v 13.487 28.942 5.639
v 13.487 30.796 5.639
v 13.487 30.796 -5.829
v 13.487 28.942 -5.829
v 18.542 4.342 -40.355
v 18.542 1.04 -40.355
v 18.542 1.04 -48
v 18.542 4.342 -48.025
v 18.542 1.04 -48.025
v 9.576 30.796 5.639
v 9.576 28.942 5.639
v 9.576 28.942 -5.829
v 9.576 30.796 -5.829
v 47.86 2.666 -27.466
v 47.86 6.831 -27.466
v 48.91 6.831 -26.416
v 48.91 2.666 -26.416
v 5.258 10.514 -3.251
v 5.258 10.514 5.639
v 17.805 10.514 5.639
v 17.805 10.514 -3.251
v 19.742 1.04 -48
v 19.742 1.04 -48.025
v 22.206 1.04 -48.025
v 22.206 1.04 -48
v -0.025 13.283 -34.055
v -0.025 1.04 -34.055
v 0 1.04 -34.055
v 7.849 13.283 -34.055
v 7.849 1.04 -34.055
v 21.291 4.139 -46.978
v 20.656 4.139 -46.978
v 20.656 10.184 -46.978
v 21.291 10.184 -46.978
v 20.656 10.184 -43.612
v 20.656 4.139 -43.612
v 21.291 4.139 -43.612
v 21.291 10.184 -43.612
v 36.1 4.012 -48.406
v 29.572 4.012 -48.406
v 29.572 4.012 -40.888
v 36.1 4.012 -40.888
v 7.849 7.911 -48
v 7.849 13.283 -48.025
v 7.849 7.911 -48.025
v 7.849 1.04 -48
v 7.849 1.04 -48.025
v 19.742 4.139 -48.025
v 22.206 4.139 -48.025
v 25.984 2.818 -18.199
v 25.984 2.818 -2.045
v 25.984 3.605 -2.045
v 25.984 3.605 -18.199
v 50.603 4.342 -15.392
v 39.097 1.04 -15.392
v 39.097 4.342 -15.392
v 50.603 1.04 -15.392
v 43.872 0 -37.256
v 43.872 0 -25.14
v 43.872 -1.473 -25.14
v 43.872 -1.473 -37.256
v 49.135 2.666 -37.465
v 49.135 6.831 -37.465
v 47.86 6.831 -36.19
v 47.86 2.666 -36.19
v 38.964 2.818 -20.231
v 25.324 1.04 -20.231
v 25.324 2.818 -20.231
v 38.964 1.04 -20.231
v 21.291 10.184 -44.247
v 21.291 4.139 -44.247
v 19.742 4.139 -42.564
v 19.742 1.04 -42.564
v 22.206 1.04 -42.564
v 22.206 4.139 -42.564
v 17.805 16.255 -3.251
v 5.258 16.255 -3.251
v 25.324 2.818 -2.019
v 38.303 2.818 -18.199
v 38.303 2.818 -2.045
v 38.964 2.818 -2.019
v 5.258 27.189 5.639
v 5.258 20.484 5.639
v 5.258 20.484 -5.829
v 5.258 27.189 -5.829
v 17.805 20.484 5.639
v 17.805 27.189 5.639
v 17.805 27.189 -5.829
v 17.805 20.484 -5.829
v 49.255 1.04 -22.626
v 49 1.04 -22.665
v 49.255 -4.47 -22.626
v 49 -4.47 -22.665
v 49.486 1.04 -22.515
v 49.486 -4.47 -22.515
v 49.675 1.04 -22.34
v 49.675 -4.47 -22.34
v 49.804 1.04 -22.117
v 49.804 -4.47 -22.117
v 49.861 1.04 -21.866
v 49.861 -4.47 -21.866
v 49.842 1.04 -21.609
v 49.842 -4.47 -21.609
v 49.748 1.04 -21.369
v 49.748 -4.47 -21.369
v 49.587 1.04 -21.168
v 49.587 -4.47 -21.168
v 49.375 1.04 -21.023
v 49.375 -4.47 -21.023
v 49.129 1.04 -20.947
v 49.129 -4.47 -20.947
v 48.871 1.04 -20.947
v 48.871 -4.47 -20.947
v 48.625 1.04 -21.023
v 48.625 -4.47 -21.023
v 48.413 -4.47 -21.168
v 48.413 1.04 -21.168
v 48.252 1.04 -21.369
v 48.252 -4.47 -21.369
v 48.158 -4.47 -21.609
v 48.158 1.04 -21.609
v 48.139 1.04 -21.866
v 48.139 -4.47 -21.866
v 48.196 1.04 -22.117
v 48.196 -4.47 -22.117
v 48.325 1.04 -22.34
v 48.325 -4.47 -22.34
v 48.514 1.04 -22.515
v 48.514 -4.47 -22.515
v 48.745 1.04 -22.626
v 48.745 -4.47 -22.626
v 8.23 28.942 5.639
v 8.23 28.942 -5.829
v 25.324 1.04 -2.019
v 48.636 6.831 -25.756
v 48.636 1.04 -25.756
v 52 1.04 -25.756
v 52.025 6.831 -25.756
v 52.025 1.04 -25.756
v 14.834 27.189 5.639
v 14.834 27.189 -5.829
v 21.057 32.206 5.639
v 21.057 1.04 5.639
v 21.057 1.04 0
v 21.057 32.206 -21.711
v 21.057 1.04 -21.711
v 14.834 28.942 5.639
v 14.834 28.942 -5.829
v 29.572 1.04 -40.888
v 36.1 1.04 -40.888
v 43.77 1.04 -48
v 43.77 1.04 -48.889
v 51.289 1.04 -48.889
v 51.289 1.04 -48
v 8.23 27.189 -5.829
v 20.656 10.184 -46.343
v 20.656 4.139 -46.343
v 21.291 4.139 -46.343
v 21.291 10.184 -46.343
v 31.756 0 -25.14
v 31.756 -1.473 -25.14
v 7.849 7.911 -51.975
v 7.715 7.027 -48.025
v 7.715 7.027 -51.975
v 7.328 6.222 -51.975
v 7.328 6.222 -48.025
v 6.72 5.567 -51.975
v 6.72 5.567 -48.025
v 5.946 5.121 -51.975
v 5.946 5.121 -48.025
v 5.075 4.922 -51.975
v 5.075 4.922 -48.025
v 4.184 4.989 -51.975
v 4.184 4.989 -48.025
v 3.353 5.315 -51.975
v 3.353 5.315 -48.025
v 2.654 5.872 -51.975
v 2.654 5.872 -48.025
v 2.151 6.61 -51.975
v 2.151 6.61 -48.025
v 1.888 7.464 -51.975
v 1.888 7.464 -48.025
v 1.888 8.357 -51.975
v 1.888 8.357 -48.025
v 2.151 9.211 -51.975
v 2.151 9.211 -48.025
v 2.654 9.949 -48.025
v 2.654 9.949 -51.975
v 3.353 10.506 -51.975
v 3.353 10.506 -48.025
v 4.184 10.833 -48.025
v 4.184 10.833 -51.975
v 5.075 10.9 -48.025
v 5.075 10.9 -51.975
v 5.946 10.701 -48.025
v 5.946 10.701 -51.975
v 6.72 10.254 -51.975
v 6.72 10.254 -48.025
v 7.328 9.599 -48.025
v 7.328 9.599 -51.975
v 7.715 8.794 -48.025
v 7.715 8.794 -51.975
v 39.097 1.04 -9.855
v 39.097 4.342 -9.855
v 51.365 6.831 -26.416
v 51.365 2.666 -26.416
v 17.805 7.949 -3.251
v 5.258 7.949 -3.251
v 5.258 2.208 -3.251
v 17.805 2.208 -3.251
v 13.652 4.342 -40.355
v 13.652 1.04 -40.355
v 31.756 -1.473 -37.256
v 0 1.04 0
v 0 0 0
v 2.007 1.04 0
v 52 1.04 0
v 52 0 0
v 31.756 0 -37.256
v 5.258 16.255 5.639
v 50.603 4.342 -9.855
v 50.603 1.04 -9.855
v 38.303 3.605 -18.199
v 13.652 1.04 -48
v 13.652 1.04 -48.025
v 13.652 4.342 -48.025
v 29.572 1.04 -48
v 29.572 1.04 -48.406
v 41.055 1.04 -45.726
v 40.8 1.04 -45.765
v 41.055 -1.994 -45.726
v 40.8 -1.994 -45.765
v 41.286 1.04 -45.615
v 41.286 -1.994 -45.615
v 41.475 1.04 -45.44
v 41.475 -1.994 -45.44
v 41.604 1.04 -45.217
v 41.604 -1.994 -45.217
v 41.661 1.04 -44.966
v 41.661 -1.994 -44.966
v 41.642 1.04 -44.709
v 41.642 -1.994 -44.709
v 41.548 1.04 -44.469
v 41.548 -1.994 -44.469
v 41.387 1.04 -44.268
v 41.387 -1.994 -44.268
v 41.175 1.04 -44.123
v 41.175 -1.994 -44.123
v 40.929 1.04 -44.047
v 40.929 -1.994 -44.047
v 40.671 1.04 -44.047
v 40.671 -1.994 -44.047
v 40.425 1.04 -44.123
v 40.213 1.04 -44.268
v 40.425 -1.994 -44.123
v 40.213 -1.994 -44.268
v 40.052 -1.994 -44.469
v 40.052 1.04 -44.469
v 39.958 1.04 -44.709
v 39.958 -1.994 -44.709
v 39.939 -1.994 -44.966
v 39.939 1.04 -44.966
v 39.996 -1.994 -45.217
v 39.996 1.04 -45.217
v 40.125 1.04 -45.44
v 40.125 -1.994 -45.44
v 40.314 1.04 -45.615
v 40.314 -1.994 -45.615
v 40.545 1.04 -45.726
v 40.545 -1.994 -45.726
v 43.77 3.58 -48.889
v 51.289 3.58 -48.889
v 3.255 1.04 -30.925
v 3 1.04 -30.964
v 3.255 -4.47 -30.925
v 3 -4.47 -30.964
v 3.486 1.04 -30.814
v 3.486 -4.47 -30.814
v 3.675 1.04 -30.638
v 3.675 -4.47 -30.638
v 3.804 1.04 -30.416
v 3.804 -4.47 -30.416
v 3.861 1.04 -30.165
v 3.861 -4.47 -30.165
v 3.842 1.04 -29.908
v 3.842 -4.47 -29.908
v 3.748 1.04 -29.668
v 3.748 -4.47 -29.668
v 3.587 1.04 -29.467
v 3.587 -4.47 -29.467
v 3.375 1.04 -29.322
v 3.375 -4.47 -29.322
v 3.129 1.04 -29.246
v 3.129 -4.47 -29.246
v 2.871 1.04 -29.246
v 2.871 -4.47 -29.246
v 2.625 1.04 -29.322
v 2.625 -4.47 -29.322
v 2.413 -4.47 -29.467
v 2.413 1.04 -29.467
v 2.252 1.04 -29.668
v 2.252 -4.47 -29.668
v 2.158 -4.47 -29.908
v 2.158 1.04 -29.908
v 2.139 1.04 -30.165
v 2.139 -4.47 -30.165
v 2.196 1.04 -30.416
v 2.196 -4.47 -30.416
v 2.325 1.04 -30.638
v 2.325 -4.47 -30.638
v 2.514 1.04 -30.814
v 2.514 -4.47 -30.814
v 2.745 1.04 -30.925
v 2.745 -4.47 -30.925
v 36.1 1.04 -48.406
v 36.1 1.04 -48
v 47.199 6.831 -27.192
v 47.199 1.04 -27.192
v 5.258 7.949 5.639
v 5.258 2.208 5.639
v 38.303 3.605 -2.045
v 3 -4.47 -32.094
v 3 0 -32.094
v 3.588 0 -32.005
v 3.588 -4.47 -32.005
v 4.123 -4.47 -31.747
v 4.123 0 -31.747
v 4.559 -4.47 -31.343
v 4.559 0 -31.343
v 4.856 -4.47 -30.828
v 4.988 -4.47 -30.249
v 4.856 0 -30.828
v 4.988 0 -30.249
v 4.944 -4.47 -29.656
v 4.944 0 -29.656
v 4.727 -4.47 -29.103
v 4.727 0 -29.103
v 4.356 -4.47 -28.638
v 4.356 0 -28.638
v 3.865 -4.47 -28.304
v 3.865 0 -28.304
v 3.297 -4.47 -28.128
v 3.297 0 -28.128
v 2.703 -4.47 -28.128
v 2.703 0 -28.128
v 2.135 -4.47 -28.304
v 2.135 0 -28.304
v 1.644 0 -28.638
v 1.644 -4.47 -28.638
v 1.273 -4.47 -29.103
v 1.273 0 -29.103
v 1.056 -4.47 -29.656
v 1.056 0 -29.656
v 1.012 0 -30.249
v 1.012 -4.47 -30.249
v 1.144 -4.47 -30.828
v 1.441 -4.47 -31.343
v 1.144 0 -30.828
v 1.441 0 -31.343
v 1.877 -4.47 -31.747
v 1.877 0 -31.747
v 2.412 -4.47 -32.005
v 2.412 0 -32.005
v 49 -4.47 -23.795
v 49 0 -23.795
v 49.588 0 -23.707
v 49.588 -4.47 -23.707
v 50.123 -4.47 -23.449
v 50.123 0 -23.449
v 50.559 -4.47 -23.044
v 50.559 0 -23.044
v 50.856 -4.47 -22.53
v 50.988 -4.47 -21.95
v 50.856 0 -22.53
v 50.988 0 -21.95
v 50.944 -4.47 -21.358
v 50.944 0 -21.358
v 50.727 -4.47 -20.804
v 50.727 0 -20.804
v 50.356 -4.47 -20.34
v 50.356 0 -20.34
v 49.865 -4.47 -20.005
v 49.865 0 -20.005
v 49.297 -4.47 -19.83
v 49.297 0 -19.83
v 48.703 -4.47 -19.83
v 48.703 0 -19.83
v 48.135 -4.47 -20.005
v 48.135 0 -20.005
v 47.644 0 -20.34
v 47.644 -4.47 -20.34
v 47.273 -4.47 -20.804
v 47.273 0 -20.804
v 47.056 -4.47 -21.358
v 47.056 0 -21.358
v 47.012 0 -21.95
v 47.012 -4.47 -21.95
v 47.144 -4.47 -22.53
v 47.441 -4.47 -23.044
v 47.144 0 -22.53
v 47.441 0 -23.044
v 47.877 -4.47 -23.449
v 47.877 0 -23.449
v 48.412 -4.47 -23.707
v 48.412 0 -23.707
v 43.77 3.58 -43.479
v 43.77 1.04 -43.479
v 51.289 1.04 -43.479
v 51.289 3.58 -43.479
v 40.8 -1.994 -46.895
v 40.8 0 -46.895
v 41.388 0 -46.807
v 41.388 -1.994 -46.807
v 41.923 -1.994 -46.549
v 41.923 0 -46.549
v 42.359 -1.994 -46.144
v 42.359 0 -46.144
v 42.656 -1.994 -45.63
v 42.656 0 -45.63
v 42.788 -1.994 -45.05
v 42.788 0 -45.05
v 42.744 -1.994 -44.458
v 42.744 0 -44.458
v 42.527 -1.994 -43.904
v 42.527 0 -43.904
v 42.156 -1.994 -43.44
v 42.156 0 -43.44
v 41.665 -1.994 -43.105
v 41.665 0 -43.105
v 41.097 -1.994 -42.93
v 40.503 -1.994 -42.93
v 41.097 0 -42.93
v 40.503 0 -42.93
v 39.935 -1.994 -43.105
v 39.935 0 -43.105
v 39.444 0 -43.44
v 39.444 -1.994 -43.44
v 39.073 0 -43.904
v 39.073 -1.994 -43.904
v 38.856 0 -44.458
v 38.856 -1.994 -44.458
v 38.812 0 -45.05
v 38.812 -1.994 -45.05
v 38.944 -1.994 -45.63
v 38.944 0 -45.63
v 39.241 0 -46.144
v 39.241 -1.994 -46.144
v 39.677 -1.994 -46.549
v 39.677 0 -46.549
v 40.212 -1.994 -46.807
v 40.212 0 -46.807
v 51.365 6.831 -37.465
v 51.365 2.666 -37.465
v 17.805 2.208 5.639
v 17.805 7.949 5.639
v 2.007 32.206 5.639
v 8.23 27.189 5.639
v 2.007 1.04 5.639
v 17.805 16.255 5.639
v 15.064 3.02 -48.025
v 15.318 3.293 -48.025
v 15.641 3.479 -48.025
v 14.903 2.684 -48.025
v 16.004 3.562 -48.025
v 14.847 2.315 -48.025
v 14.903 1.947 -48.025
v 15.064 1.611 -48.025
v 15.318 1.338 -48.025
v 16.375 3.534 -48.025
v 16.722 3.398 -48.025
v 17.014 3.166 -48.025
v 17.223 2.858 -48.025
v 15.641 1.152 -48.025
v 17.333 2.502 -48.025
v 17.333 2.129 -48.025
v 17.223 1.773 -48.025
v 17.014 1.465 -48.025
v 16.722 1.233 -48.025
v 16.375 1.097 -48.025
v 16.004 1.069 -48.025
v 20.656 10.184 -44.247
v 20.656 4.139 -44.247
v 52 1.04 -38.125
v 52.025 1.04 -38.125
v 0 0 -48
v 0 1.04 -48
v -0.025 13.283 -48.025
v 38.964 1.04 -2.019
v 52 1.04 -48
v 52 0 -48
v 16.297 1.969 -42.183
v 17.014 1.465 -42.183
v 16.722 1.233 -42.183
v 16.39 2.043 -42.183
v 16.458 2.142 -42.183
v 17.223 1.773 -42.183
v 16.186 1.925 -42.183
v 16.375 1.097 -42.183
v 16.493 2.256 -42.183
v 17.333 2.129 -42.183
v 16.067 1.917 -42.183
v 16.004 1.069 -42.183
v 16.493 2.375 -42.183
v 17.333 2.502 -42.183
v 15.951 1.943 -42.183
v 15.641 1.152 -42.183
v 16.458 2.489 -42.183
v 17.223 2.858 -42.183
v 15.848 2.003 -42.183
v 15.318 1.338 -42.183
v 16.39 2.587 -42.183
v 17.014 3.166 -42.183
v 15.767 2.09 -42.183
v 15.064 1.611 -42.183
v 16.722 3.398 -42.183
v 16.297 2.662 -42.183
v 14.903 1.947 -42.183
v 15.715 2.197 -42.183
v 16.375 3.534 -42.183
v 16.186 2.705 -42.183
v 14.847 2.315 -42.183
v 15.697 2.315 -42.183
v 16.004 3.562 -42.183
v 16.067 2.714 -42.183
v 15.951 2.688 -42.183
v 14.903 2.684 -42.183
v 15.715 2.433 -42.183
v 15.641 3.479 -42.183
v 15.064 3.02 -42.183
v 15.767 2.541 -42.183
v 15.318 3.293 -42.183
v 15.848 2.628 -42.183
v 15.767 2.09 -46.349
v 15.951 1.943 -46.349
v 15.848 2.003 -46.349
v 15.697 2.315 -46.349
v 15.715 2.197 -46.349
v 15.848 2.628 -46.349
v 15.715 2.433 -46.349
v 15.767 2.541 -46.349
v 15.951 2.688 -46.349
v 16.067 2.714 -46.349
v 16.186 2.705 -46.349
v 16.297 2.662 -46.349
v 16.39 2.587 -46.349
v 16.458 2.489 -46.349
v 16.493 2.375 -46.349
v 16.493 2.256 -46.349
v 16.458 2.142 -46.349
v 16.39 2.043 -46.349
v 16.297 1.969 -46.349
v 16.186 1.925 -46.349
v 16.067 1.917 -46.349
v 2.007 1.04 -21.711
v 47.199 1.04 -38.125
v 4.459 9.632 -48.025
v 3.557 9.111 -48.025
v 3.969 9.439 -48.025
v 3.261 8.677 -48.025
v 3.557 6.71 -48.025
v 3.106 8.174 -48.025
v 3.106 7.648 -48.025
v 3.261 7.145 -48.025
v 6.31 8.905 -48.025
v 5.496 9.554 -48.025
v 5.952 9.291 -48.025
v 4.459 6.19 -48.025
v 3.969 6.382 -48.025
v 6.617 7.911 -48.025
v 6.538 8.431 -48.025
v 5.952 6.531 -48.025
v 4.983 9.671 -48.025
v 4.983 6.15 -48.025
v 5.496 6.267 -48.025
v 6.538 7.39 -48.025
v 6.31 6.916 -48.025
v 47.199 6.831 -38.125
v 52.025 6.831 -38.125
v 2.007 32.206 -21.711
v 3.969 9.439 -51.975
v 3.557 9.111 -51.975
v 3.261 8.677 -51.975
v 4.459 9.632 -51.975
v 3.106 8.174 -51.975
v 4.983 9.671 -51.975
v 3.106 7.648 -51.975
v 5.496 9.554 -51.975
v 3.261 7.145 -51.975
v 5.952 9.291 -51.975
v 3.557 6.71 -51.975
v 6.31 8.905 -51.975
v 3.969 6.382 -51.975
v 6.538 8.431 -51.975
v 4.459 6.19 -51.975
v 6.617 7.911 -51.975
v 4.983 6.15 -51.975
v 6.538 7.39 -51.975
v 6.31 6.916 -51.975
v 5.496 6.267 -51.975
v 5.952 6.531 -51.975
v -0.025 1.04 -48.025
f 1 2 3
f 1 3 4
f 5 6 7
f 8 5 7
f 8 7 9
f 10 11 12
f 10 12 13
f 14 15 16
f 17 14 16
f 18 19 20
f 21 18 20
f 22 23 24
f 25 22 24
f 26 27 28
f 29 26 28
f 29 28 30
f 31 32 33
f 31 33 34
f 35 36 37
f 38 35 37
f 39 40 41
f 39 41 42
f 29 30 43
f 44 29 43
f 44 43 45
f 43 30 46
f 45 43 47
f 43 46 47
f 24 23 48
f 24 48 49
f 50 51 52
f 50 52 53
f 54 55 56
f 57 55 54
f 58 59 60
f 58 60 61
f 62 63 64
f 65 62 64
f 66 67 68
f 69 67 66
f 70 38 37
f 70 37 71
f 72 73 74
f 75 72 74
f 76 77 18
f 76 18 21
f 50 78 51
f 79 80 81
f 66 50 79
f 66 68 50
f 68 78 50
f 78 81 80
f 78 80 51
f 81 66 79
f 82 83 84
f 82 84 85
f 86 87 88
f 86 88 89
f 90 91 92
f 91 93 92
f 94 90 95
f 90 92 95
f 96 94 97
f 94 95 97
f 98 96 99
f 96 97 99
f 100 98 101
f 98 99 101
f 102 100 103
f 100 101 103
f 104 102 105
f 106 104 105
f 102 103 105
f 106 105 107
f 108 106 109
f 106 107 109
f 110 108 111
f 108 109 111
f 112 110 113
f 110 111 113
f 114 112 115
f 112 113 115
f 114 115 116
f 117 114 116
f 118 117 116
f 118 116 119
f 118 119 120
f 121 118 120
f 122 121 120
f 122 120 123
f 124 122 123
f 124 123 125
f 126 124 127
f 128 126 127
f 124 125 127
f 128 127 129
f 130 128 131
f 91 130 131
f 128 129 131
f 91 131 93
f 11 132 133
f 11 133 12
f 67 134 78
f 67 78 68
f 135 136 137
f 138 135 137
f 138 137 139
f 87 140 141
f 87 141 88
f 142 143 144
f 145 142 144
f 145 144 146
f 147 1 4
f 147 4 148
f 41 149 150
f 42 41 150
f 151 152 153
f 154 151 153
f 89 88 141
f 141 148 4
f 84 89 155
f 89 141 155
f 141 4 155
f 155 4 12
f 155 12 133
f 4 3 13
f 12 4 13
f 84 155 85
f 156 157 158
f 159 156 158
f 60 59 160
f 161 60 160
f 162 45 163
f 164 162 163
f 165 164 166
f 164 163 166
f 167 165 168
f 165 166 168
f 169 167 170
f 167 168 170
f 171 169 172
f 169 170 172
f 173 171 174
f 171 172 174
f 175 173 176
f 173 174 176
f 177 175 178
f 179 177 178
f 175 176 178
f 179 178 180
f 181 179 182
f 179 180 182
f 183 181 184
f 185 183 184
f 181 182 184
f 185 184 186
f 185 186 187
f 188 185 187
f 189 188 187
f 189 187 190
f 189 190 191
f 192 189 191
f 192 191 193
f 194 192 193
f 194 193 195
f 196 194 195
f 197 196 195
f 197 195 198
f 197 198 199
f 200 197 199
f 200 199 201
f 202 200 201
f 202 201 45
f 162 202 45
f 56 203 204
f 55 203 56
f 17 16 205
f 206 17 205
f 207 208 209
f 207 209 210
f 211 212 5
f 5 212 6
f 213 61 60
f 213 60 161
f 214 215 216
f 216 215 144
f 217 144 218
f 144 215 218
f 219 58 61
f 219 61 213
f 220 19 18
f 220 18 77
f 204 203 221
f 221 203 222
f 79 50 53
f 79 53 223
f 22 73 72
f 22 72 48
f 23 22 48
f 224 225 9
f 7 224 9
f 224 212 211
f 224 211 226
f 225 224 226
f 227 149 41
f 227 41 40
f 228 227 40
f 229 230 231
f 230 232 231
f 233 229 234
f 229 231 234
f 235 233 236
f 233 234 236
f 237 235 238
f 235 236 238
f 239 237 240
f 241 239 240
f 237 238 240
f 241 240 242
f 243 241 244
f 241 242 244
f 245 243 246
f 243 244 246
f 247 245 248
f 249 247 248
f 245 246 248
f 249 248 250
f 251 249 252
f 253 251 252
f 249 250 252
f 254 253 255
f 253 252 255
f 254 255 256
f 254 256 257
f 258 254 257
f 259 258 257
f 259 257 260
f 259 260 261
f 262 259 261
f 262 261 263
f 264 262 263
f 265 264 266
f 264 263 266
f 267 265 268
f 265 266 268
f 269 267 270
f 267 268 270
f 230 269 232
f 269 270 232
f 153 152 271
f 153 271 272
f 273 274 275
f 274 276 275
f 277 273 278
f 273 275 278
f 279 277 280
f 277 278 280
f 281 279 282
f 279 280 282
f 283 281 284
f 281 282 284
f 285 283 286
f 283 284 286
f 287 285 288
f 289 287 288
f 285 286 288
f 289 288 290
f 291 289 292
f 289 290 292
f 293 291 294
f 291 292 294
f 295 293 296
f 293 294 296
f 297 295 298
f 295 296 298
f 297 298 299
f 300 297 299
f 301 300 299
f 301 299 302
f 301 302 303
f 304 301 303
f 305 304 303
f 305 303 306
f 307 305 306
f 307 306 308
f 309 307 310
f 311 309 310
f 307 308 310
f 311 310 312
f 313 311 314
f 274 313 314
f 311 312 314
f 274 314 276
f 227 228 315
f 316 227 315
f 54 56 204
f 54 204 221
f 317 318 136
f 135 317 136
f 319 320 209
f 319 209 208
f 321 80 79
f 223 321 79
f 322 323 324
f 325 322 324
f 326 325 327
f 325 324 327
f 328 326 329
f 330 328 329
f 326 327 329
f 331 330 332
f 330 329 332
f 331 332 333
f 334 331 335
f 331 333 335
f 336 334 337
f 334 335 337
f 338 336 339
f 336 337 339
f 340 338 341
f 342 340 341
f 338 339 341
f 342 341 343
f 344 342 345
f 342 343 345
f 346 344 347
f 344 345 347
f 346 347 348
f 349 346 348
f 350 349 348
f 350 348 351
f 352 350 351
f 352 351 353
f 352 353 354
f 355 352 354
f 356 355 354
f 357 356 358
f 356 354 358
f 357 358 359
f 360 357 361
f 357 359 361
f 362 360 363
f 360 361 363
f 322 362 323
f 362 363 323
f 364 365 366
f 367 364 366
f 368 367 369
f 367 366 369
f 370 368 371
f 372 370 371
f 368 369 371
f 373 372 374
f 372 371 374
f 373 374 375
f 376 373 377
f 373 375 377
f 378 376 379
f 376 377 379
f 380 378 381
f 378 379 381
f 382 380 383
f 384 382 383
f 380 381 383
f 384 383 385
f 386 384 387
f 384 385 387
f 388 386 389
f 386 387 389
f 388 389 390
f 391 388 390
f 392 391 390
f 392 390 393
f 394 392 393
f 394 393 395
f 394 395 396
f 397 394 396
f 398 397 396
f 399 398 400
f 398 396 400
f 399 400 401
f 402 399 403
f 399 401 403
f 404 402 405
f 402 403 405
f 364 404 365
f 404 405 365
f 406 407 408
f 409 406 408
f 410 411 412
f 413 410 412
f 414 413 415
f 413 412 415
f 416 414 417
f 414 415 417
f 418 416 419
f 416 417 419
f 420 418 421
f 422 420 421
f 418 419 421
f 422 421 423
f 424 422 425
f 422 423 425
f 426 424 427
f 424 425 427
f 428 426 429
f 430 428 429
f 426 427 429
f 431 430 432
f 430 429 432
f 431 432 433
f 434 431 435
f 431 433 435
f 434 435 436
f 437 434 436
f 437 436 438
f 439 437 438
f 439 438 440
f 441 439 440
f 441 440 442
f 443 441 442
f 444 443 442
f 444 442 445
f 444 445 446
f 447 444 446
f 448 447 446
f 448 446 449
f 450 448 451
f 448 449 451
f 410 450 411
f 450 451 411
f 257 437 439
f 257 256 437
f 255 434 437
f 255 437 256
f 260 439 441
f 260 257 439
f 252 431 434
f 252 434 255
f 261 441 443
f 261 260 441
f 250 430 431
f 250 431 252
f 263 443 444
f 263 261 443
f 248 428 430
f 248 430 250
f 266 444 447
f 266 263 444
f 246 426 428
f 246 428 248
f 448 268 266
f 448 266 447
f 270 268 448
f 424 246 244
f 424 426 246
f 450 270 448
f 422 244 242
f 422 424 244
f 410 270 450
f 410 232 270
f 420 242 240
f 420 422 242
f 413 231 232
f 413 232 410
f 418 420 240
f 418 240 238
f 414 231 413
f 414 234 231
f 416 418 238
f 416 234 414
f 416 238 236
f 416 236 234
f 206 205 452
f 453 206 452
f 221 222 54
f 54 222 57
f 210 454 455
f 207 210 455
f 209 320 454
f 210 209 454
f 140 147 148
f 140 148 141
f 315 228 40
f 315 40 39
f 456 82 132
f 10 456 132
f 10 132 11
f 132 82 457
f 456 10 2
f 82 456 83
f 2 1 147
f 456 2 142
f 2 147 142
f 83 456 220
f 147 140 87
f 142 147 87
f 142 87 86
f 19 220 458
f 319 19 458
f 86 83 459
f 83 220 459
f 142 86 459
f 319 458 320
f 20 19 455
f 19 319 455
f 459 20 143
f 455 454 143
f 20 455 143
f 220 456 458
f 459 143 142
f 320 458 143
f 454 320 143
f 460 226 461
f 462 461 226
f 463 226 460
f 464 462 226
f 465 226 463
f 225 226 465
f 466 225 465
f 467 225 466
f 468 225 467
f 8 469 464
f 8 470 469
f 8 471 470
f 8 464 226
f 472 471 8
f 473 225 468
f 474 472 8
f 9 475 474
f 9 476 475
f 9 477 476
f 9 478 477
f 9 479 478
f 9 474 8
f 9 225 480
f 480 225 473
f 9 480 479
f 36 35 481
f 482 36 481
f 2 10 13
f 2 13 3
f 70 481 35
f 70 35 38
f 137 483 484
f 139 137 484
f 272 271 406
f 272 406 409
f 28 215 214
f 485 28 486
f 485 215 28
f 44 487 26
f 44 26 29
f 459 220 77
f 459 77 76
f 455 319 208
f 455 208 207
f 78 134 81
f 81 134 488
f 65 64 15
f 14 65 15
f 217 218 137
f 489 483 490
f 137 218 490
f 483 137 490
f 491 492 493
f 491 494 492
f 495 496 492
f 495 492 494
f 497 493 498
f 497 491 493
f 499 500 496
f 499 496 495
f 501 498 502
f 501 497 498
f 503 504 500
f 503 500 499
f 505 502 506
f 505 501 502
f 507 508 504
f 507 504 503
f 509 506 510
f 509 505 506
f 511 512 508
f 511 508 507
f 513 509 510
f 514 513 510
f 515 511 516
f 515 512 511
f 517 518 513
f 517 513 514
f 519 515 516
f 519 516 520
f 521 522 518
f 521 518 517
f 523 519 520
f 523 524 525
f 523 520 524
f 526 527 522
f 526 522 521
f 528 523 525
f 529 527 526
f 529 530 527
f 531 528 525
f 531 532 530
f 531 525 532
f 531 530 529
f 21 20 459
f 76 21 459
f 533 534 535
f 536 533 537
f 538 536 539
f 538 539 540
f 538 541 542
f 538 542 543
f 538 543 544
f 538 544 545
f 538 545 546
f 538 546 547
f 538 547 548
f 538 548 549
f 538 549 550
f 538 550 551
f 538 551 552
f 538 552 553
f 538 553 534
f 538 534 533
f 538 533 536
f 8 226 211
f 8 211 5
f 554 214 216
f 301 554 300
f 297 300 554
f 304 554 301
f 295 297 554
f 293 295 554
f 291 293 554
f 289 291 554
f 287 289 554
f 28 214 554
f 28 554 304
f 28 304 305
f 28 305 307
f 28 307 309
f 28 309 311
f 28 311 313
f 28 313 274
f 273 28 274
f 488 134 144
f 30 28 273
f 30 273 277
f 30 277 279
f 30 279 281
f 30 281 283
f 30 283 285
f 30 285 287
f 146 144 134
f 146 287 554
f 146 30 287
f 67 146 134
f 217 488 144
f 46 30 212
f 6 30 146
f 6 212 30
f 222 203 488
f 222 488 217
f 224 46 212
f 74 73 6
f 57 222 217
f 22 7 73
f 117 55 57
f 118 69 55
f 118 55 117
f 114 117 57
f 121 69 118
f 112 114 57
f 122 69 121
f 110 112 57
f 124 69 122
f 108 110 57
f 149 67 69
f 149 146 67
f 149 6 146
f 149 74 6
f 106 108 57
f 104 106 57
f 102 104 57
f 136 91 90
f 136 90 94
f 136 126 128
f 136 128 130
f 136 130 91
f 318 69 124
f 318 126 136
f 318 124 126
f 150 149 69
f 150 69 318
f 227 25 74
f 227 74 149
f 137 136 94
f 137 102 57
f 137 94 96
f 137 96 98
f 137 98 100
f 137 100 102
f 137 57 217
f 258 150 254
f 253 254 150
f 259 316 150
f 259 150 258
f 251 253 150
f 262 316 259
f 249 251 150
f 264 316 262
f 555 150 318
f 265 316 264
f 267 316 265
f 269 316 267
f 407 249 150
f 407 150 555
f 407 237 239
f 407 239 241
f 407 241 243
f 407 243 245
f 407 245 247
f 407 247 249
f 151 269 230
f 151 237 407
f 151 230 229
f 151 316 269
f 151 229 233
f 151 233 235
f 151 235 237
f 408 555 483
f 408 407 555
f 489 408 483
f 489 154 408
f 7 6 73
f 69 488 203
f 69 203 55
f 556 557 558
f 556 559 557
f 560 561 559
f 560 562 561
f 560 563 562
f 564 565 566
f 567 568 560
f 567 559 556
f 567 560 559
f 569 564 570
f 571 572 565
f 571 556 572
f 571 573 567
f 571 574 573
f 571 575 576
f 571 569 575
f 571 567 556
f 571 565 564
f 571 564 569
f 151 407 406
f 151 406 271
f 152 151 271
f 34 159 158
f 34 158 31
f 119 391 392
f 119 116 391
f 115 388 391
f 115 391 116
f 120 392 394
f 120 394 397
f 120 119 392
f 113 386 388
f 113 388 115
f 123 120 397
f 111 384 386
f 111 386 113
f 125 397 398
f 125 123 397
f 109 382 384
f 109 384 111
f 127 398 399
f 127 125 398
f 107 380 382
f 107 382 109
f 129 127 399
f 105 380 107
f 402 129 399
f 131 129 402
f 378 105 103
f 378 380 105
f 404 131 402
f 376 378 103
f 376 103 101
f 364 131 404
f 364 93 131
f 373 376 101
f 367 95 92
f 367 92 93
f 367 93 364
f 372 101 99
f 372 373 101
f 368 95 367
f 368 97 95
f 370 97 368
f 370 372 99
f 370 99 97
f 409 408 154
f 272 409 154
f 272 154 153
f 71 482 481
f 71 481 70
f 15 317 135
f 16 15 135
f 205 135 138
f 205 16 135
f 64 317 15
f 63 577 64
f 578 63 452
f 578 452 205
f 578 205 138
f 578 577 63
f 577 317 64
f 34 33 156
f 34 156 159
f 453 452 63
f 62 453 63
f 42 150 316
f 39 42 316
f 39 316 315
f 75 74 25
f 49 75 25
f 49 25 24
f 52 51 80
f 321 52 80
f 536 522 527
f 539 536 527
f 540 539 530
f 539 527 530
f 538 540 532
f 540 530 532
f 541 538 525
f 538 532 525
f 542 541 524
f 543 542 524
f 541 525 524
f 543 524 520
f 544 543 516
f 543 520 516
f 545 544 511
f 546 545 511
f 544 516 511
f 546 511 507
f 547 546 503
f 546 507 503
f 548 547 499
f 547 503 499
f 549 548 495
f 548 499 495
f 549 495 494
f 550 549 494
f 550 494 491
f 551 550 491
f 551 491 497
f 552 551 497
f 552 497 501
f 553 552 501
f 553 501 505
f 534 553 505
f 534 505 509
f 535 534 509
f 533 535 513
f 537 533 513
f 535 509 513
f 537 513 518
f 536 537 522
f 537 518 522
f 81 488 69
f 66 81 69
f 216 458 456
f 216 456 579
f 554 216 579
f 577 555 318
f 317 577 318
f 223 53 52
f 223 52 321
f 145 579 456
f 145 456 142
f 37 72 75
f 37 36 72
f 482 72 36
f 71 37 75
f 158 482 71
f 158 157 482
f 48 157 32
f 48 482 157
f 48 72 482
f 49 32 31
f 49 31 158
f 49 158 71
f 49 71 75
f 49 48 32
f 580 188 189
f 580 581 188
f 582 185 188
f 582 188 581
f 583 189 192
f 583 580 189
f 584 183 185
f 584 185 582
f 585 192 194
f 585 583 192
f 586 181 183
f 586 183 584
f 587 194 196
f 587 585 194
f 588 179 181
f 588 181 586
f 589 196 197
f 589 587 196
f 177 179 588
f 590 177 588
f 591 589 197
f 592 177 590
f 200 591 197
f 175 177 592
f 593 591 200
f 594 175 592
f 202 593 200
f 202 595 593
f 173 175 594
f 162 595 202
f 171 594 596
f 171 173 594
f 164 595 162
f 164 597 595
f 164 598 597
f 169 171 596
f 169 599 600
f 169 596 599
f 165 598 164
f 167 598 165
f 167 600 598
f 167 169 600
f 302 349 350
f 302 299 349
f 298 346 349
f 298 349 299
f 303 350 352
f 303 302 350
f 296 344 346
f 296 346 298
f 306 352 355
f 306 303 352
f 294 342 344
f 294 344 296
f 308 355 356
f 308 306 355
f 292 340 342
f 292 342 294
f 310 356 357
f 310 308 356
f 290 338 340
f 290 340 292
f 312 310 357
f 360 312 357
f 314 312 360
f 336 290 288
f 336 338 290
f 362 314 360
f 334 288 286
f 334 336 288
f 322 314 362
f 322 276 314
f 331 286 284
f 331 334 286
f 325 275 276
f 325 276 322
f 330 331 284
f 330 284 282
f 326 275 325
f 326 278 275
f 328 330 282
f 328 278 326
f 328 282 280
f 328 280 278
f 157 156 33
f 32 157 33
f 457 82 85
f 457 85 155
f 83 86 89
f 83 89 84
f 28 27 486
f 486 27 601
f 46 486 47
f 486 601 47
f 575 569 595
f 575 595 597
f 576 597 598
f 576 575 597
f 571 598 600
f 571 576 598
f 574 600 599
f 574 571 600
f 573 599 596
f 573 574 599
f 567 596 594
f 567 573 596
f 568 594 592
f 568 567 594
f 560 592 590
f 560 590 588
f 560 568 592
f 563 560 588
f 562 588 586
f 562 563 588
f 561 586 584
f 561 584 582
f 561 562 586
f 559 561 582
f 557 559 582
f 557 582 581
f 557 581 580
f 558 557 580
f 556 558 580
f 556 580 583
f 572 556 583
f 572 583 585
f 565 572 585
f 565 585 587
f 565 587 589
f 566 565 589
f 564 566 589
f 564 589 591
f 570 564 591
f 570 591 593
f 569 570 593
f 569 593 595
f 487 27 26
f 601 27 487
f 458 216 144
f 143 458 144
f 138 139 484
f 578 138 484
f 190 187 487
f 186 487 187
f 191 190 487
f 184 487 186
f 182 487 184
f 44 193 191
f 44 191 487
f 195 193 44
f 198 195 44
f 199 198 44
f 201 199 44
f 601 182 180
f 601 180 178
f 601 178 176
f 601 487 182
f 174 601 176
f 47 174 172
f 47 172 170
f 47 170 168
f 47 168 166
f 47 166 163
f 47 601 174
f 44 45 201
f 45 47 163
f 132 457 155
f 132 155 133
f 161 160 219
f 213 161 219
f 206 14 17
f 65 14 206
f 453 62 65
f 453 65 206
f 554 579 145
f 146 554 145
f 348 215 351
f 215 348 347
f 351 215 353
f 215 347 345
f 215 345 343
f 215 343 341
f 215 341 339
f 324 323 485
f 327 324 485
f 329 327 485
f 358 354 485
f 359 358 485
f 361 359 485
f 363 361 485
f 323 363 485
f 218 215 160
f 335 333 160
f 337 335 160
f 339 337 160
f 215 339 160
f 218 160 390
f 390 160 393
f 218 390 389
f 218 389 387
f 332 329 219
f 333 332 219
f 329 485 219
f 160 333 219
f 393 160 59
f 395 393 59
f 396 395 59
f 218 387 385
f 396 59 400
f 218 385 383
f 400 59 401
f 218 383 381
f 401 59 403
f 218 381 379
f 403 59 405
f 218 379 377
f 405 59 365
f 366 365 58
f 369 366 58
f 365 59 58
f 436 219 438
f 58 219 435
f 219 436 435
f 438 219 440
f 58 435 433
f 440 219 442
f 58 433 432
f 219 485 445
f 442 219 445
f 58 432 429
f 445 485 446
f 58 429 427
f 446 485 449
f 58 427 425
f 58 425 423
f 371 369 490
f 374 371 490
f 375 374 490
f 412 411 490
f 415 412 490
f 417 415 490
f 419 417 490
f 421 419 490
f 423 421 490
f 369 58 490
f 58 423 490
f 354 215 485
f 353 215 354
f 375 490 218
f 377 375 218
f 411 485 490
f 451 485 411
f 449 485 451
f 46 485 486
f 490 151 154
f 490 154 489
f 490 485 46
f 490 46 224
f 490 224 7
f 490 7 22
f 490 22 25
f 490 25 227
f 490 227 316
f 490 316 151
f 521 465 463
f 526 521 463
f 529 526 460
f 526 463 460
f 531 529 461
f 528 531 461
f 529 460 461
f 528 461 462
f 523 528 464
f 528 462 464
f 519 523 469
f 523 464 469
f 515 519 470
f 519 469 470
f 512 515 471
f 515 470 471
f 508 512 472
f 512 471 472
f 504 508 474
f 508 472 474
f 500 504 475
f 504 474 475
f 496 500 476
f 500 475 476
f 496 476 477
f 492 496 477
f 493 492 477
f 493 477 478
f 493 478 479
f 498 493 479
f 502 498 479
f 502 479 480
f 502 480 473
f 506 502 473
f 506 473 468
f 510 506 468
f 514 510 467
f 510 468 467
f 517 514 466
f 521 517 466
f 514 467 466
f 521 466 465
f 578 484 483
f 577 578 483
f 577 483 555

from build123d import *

# Parameters (mm, degrees)
SKETCH1_W                   = 52
SKETCH1_H                   = 48
BASE_DEPTH                  = 1.04
SKETCH3_W                   = 19.05
SKETCH3_H                   = 27.35
ETHERNET_USB_LINKPP_DEPTH   = 31.1658
SKETCH4_W                   = 12.5476
SKETCH4_H                   = 5.7404
USB_PORTS_DEPTH             = 8.89
ETHERNET_PORT_DEPTH         = 11.4681
SKETCH6_W                   = 7.874
SKETCH6_H                   = 13.97
HEADPHONE_JACK_DEPTH        = 12.2428
SKETCH7_R                   = 2.9972
SKETCH7_R_2                 = 1.7653
HEADPHONE_JACK_CIRCLE_DEPTH = 3.9751
SKETCH8_W                   = 4.8895
SKETCH8_H                   = 7.6708
DC_POWER_DEPTH              = 3.302
SKETCH9_R                   = 1.25
DC_POWER_HOLE_DEPTH         = 5.842
SKETCH10_R                  = 0.4
DC_POWER_PIN_DEPTH          = 4.1656
SKETCH11_W                  = 2.4638
SKETCH11_H                  = 5.461
PWM_PIN_BASE_DEPTH          = 3.0988
SKETCH12_W                  = 0.635
SKETCH12_H                  = 0.635
PWM_PINS_DEPTH              = 6.0452
SKETCH13_W                  = 6.5278
SKETCH13_H                  = 7.5184
MICRO_HDMI_PORT_DEPTH       = 2.9718
SKETCH14_W                  = 7.5184
SKETCH14_H                  = 5.4102
MICRO_USB_PORT_DEPTH        = 2.54
HEADER_HOLE_REACH           = 82.266
SKETCH15_R                  = 0.8636
SKETCH16_R                  = 1.9939
STANDOFFS_1_DEPTH           = 4.4704
SKETCH17_R                  = 1.9939
SHORT_STANDOFF_DEPTH        = 1.9939
THREADS_IN_STANDOFFS_REACH  = 82.266
SKETCH19_R                  = 0.8636
SKETCH20_W                  = 12.1158
SKETCH20_H                  = 12.1158
CPU_DEPTH                   = 1.4732
UART_PLASTIC_DEPTH          = 5.7912
UART_HOLE_DEPTH             = 4.1656
SKETCH23_W                  = 11.5062
SKETCH23_H                  = 5.5372
MICROSD_DEPTH               = 3.302
SKETCH24_W                  = 13.6398
SKETCH24_H                  = 18.2118
EMMC_BOARD_DEPTH            = 1.778
SKETCH25_W                  = 12.319
SKETCH25_H                  = 16.1544
EMMC_CHIP_DEPTH             = 0.7874


with BuildPart() as part:
    # Sketch1 → Base (new body)
    with BuildSketch(Plane(origin=(0, 0, 0), x_dir=(1, 0, 0), z_dir=(0, 1, 0))):
        with Locations((26, 24)):
            Rectangle(SKETCH1_W, SKETCH1_H)
    extrude(amount=BASE_DEPTH)

    # Sketch3 → Ethernet-USB-LinkPP (add)
    with BuildSketch(Plane(origin=(0, 1.04, 0), x_dir=(1, 0, 0), z_dir=(0, 1, 0))):
        with Locations((11.5316, 8.0362)):
            Rectangle(SKETCH3_W, SKETCH3_H)
    extrude(amount=ETHERNET_USB_LINKPP_DEPTH)

    # Sketch4 → USB ports (cut)
    with BuildSketch(Plane.XY.offset(5.6388)):
        with Locations((11.5316, 5.0786)):
            Rectangle(SKETCH4_W, SKETCH4_H)
        with Locations((11.5316, 13.3844)):
            Rectangle(SKETCH4_W, SKETCH4_H)
    extrude(amount=-USB_PORTS_DEPTH, mode=Mode.SUBTRACT)

    # Sketch5 → Ethernet port (cut)
    with BuildSketch(Plane.XY.offset(5.6388)):
        Polygon((5.2578, 27.1893), (8.2296, 27.1893), (8.2296, 28.9419), (9.5758, 28.9419), (9.5758, 30.7961), (13.4874, 30.7961), (13.4874, 28.9419), (14.8336, 28.9419), (14.8336, 27.1893), (17.8054, 27.1893), (17.8054, 20.4837), (5.2578, 20.4837), align=None)
    extrude(amount=-ETHERNET_PORT_DEPTH, mode=Mode.SUBTRACT)

    # Sketch6 → Headphone jack (add)
    with BuildSketch(Plane(origin=(0, 1.04, 0), x_dir=(1, 0, 0), z_dir=(0, 1, 0))):
        with Locations((3.9116, 41.0404)):
            Rectangle(SKETCH6_W, SKETCH6_H)
    extrude(amount=HEADPHONE_JACK_DEPTH)

    # Sketch7 → Headphone jack circle (add)
    with BuildSketch(Plane(origin=(0, 0, -48), x_dir=(-1, 0, 0), z_dir=(0, 0, -1))):
        with Locations(Location((-4.8514, 7.9107, 0), (0, 0, 180))):
            Circle(SKETCH7_R)
        with Locations(Location((-4.8514, 7.9107, 0), (0, 0, 180))):
            Circle(SKETCH7_R_2, mode=Mode.SUBTRACT)
    extrude(amount=HEADPHONE_JACK_CIRCLE_DEPTH)

    # Sketch8 → DC power (add)
    with BuildSketch(Plane(origin=(0, 1.04, 0), x_dir=(1, 0, 0), z_dir=(0, 1, 0))):
        with Locations((16.09725, 44.19)):
            Rectangle(SKETCH8_W, SKETCH8_H)
    extrude(amount=DC_POWER_DEPTH)

    # Sketch9 → DC power hole (cut)
    with BuildSketch(Plane(origin=(0, 0, -48.0254), x_dir=(-1, 0, 0), z_dir=(0, 0, -1))):
        with Locations((-16.09725, 2.3154)):
            Circle(SKETCH9_R)
    extrude(amount=-DC_POWER_HOLE_DEPTH, mode=Mode.SUBTRACT)

    # Sketch10 → DC power pin (add)
    with BuildSketch(Plane(origin=(0, 0, -42.1834), x_dir=(-1, 0, 0), z_dir=(0, 0, -1))):
        with Locations((-16.09725, 2.3154)):
            Circle(SKETCH10_R)
    extrude(amount=DC_POWER_PIN_DEPTH)

    # Sketch11 → PWM pin base (add)
    with BuildSketch(Plane(origin=(0, 1.04, 0), x_dir=(1, 0, 0), z_dir=(0, 1, 0))):
        with Locations((20.9739, 45.2949)):
            Rectangle(SKETCH11_W, SKETCH11_H)
    extrude(amount=PWM_PIN_BASE_DEPTH)

    # Sketch12 → PWM pins (add)
    with BuildSketch(Plane(origin=(0, 4.1388, 0), x_dir=(1, 0, 0), z_dir=(0, 1, 0))):
        with Locations((20.9739, 43.92965)):
            Rectangle(SKETCH12_W, SKETCH12_H)
        with Locations((20.9739, 46.66015)):
            Rectangle(SKETCH12_W, SKETCH12_H)
    extrude(amount=PWM_PINS_DEPTH)

    # Sketch13 → Micro HDMI port (add)
    with BuildSketch(Plane(origin=(0, 1.04, 0), x_dir=(1, 0, 0), z_dir=(0, 1, 0))):
        with Locations((32.8357, 44.6472)):
            Rectangle(SKETCH13_W, SKETCH13_H)
    extrude(amount=MICRO_HDMI_PORT_DEPTH)

    # Sketch14 → Micro USB port (add)
    with BuildSketch(Plane(origin=(0, 1.04, 0), x_dir=(1, 0, 0), z_dir=(0, 1, 0))):
        with Locations((47.5296, 46.1839)):
            Rectangle(SKETCH14_W, SKETCH14_H)
    extrude(amount=MICRO_USB_PORT_DEPTH)

    # Sketch15 → Header hole (cut, up to next)
    with BuildSketch(Plane(origin=(0, 0, 0), x_dir=(-1, 0, 0), z_dir=(0, -1, 0)), mode=Mode.PRIVATE) as header_hole_sk1:
        with Locations(Location((-3, 30.1, 0), (0, 0, 90))):
            Circle(SKETCH15_R)
    header_hole_tool1 = extrude(header_hole_sk1.sketch, amount=-HEADER_HOLE_REACH, mode=Mode.PRIVATE) & part.part
    # Sketch15 → Header hole (cut, up to next)
    with BuildSketch(Plane(origin=(0, 0, 0), x_dir=(-1, 0, 0), z_dir=(0, -1, 0)), mode=Mode.PRIVATE) as header_hole_sk2:
        with Locations(Location((-49, 21.8012, 0), (0, 0, 90))):
            Circle(SKETCH15_R)
    header_hole_tool2 = extrude(header_hole_sk2.sketch, amount=-HEADER_HOLE_REACH, mode=Mode.PRIVATE) & part.part
    # Sketch15 → Header hole (cut, up to next)
    with BuildSketch(Plane(origin=(0, 0, 0), x_dir=(-1, 0, 0), z_dir=(0, -1, 0)), mode=Mode.PRIVATE) as header_hole_sk3:
        with Locations(Location((-40.8, 44.9012, 0), (0, 0, 90))):
            Circle(SKETCH15_R)
    header_hole_tool3 = extrude(header_hole_sk3.sketch, amount=-HEADER_HOLE_REACH, mode=Mode.PRIVATE) & part.part
    add(header_hole_tool1.solids().sort_by_distance((3, 0, -30.1))[0], mode=Mode.SUBTRACT)
    add(header_hole_tool2.solids().sort_by_distance((49, 0, -21.8012))[0], mode=Mode.SUBTRACT)
    add(header_hole_tool3.solids().sort_by_distance((40.8, 0, -44.9012))[0], mode=Mode.SUBTRACT)

    # Sketch16 → Standoffs 1 (add)
    with BuildSketch(Plane.XZ):
        with Locations(Location((49, -21.8012, 0), (0, 0, 270))):
            Circle(SKETCH16_R)
        with Locations(Location((3, -30.1, 0), (0, 0, 270))):
            Circle(SKETCH16_R)
    extrude(amount=STANDOFFS_1_DEPTH)

    # Sketch17 → Short standoff (add)
    with BuildSketch(Plane.XZ):
        with Locations(Location((40.8, -44.9012, 0), (0, 0, 270))):
            Circle(SKETCH17_R)
    extrude(amount=SHORT_STANDOFF_DEPTH)

    # Sketch19 → Threads in standoffs (cut, up to next)
    with BuildSketch(Plane.XZ, mode=Mode.PRIVATE) as threads_in_standoffs_sk1:
        with Locations(Location((40.8, -44.9012, 0), (0, 0, 270))):
            Circle(SKETCH19_R)
    threads_in_standoffs_tool1 = extrude(threads_in_standoffs_sk1.sketch, amount=THREADS_IN_STANDOFFS_REACH, mode=Mode.PRIVATE) & part.part
    # Sketch19 → Threads in standoffs (cut, up to next)
    with BuildSketch(Plane.XZ, mode=Mode.PRIVATE) as threads_in_standoffs_sk2:
        with Locations(Location((49, -21.8012, 0), (0, 0, 270))):
            Circle(SKETCH19_R)
    threads_in_standoffs_tool2 = extrude(threads_in_standoffs_sk2.sketch, amount=THREADS_IN_STANDOFFS_REACH, mode=Mode.PRIVATE) & part.part
    # Sketch19 → Threads in standoffs (cut, up to next)
    with BuildSketch(Plane.XZ, mode=Mode.PRIVATE) as threads_in_standoffs_sk3:
        with Locations(Location((3, -30.1, 0), (0, 0, 270))):
            Circle(SKETCH19_R)
    threads_in_standoffs_tool3 = extrude(threads_in_standoffs_sk3.sketch, amount=THREADS_IN_STANDOFFS_REACH, mode=Mode.PRIVATE) & part.part
    add(threads_in_standoffs_tool1.solids().sort_by_distance((40.8, 0, -44.9012))[0], mode=Mode.SUBTRACT)
    add(threads_in_standoffs_tool2.solids().sort_by_distance((49, 0, -21.8012))[0], mode=Mode.SUBTRACT)
    add(threads_in_standoffs_tool3.solids().sort_by_distance((3, 0, -30.1))[0], mode=Mode.SUBTRACT)

    # Sketch20 → CPU (add)
    with BuildSketch(Plane(origin=(0, 0, 0), x_dir=(-1, 0, 0), z_dir=(0, -1, 0))):
        with Locations((-37.8141, 31.1979)):
            Rectangle(SKETCH20_W, SKETCH20_H)
    extrude(amount=CPU_DEPTH)

    # Sketch21 → UART plastic (add)
    with BuildSketch(Plane(origin=(0, 1.04, 0), x_dir=(1, 0, 0), z_dir=(0, 1, 0))):
        Polygon((52.0254, 38.1254), (47.1994, 38.1254), (47.1994, 27.192440979), (48.636240979, 25.7556), (52.0254, 25.7556), align=None)
    extrude(amount=UART_PLASTIC_DEPTH)

    # Sketch22 → UART hole (cut)
    with BuildSketch(Plane(origin=(0, 6.8312, 0), x_dir=(1, 0, 0), z_dir=(0, 1, 0))):
        Polygon((51.365, 37.465), (49.134996369, 37.465), (47.8598, 36.189803631), (47.8598, 27.465987616), (48.909787616, 26.416), (51.365, 26.416), align=None)
    extrude(amount=-UART_HOLE_DEPTH, mode=Mode.SUBTRACT)

    # Sketch23 → MicroSD (add)
    with BuildSketch(Plane(origin=(0, 1.04, 0), x_dir=(1, 0, 0), z_dir=(0, 1, 0))):
        with Locations((44.8499, 12.6238)):
            Rectangle(SKETCH23_W, SKETCH23_H)
    extrude(amount=MICROSD_DEPTH)

    # Sketch24 → eMMC board (add)
    with BuildSketch(Plane(origin=(0, 1.04, 0), x_dir=(1, 0, 0), z_dir=(0, 1, 0))):
        with Locations((32.1437, 11.1252)):
            Rectangle(SKETCH24_W, SKETCH24_H)
    extrude(amount=EMMC_BOARD_DEPTH)

    # Sketch25 → eMMC chip (add)
    with BuildSketch(Plane(origin=(0, 2.818, 0), x_dir=(1, 0, 0), z_dir=(0, 1, 0))):
        with Locations((32.1437, 10.1219)):
            Rectangle(SKETCH25_W, SKETCH25_H)
    extrude(amount=EMMC_CHIP_DEPTH)


solid = part.part
